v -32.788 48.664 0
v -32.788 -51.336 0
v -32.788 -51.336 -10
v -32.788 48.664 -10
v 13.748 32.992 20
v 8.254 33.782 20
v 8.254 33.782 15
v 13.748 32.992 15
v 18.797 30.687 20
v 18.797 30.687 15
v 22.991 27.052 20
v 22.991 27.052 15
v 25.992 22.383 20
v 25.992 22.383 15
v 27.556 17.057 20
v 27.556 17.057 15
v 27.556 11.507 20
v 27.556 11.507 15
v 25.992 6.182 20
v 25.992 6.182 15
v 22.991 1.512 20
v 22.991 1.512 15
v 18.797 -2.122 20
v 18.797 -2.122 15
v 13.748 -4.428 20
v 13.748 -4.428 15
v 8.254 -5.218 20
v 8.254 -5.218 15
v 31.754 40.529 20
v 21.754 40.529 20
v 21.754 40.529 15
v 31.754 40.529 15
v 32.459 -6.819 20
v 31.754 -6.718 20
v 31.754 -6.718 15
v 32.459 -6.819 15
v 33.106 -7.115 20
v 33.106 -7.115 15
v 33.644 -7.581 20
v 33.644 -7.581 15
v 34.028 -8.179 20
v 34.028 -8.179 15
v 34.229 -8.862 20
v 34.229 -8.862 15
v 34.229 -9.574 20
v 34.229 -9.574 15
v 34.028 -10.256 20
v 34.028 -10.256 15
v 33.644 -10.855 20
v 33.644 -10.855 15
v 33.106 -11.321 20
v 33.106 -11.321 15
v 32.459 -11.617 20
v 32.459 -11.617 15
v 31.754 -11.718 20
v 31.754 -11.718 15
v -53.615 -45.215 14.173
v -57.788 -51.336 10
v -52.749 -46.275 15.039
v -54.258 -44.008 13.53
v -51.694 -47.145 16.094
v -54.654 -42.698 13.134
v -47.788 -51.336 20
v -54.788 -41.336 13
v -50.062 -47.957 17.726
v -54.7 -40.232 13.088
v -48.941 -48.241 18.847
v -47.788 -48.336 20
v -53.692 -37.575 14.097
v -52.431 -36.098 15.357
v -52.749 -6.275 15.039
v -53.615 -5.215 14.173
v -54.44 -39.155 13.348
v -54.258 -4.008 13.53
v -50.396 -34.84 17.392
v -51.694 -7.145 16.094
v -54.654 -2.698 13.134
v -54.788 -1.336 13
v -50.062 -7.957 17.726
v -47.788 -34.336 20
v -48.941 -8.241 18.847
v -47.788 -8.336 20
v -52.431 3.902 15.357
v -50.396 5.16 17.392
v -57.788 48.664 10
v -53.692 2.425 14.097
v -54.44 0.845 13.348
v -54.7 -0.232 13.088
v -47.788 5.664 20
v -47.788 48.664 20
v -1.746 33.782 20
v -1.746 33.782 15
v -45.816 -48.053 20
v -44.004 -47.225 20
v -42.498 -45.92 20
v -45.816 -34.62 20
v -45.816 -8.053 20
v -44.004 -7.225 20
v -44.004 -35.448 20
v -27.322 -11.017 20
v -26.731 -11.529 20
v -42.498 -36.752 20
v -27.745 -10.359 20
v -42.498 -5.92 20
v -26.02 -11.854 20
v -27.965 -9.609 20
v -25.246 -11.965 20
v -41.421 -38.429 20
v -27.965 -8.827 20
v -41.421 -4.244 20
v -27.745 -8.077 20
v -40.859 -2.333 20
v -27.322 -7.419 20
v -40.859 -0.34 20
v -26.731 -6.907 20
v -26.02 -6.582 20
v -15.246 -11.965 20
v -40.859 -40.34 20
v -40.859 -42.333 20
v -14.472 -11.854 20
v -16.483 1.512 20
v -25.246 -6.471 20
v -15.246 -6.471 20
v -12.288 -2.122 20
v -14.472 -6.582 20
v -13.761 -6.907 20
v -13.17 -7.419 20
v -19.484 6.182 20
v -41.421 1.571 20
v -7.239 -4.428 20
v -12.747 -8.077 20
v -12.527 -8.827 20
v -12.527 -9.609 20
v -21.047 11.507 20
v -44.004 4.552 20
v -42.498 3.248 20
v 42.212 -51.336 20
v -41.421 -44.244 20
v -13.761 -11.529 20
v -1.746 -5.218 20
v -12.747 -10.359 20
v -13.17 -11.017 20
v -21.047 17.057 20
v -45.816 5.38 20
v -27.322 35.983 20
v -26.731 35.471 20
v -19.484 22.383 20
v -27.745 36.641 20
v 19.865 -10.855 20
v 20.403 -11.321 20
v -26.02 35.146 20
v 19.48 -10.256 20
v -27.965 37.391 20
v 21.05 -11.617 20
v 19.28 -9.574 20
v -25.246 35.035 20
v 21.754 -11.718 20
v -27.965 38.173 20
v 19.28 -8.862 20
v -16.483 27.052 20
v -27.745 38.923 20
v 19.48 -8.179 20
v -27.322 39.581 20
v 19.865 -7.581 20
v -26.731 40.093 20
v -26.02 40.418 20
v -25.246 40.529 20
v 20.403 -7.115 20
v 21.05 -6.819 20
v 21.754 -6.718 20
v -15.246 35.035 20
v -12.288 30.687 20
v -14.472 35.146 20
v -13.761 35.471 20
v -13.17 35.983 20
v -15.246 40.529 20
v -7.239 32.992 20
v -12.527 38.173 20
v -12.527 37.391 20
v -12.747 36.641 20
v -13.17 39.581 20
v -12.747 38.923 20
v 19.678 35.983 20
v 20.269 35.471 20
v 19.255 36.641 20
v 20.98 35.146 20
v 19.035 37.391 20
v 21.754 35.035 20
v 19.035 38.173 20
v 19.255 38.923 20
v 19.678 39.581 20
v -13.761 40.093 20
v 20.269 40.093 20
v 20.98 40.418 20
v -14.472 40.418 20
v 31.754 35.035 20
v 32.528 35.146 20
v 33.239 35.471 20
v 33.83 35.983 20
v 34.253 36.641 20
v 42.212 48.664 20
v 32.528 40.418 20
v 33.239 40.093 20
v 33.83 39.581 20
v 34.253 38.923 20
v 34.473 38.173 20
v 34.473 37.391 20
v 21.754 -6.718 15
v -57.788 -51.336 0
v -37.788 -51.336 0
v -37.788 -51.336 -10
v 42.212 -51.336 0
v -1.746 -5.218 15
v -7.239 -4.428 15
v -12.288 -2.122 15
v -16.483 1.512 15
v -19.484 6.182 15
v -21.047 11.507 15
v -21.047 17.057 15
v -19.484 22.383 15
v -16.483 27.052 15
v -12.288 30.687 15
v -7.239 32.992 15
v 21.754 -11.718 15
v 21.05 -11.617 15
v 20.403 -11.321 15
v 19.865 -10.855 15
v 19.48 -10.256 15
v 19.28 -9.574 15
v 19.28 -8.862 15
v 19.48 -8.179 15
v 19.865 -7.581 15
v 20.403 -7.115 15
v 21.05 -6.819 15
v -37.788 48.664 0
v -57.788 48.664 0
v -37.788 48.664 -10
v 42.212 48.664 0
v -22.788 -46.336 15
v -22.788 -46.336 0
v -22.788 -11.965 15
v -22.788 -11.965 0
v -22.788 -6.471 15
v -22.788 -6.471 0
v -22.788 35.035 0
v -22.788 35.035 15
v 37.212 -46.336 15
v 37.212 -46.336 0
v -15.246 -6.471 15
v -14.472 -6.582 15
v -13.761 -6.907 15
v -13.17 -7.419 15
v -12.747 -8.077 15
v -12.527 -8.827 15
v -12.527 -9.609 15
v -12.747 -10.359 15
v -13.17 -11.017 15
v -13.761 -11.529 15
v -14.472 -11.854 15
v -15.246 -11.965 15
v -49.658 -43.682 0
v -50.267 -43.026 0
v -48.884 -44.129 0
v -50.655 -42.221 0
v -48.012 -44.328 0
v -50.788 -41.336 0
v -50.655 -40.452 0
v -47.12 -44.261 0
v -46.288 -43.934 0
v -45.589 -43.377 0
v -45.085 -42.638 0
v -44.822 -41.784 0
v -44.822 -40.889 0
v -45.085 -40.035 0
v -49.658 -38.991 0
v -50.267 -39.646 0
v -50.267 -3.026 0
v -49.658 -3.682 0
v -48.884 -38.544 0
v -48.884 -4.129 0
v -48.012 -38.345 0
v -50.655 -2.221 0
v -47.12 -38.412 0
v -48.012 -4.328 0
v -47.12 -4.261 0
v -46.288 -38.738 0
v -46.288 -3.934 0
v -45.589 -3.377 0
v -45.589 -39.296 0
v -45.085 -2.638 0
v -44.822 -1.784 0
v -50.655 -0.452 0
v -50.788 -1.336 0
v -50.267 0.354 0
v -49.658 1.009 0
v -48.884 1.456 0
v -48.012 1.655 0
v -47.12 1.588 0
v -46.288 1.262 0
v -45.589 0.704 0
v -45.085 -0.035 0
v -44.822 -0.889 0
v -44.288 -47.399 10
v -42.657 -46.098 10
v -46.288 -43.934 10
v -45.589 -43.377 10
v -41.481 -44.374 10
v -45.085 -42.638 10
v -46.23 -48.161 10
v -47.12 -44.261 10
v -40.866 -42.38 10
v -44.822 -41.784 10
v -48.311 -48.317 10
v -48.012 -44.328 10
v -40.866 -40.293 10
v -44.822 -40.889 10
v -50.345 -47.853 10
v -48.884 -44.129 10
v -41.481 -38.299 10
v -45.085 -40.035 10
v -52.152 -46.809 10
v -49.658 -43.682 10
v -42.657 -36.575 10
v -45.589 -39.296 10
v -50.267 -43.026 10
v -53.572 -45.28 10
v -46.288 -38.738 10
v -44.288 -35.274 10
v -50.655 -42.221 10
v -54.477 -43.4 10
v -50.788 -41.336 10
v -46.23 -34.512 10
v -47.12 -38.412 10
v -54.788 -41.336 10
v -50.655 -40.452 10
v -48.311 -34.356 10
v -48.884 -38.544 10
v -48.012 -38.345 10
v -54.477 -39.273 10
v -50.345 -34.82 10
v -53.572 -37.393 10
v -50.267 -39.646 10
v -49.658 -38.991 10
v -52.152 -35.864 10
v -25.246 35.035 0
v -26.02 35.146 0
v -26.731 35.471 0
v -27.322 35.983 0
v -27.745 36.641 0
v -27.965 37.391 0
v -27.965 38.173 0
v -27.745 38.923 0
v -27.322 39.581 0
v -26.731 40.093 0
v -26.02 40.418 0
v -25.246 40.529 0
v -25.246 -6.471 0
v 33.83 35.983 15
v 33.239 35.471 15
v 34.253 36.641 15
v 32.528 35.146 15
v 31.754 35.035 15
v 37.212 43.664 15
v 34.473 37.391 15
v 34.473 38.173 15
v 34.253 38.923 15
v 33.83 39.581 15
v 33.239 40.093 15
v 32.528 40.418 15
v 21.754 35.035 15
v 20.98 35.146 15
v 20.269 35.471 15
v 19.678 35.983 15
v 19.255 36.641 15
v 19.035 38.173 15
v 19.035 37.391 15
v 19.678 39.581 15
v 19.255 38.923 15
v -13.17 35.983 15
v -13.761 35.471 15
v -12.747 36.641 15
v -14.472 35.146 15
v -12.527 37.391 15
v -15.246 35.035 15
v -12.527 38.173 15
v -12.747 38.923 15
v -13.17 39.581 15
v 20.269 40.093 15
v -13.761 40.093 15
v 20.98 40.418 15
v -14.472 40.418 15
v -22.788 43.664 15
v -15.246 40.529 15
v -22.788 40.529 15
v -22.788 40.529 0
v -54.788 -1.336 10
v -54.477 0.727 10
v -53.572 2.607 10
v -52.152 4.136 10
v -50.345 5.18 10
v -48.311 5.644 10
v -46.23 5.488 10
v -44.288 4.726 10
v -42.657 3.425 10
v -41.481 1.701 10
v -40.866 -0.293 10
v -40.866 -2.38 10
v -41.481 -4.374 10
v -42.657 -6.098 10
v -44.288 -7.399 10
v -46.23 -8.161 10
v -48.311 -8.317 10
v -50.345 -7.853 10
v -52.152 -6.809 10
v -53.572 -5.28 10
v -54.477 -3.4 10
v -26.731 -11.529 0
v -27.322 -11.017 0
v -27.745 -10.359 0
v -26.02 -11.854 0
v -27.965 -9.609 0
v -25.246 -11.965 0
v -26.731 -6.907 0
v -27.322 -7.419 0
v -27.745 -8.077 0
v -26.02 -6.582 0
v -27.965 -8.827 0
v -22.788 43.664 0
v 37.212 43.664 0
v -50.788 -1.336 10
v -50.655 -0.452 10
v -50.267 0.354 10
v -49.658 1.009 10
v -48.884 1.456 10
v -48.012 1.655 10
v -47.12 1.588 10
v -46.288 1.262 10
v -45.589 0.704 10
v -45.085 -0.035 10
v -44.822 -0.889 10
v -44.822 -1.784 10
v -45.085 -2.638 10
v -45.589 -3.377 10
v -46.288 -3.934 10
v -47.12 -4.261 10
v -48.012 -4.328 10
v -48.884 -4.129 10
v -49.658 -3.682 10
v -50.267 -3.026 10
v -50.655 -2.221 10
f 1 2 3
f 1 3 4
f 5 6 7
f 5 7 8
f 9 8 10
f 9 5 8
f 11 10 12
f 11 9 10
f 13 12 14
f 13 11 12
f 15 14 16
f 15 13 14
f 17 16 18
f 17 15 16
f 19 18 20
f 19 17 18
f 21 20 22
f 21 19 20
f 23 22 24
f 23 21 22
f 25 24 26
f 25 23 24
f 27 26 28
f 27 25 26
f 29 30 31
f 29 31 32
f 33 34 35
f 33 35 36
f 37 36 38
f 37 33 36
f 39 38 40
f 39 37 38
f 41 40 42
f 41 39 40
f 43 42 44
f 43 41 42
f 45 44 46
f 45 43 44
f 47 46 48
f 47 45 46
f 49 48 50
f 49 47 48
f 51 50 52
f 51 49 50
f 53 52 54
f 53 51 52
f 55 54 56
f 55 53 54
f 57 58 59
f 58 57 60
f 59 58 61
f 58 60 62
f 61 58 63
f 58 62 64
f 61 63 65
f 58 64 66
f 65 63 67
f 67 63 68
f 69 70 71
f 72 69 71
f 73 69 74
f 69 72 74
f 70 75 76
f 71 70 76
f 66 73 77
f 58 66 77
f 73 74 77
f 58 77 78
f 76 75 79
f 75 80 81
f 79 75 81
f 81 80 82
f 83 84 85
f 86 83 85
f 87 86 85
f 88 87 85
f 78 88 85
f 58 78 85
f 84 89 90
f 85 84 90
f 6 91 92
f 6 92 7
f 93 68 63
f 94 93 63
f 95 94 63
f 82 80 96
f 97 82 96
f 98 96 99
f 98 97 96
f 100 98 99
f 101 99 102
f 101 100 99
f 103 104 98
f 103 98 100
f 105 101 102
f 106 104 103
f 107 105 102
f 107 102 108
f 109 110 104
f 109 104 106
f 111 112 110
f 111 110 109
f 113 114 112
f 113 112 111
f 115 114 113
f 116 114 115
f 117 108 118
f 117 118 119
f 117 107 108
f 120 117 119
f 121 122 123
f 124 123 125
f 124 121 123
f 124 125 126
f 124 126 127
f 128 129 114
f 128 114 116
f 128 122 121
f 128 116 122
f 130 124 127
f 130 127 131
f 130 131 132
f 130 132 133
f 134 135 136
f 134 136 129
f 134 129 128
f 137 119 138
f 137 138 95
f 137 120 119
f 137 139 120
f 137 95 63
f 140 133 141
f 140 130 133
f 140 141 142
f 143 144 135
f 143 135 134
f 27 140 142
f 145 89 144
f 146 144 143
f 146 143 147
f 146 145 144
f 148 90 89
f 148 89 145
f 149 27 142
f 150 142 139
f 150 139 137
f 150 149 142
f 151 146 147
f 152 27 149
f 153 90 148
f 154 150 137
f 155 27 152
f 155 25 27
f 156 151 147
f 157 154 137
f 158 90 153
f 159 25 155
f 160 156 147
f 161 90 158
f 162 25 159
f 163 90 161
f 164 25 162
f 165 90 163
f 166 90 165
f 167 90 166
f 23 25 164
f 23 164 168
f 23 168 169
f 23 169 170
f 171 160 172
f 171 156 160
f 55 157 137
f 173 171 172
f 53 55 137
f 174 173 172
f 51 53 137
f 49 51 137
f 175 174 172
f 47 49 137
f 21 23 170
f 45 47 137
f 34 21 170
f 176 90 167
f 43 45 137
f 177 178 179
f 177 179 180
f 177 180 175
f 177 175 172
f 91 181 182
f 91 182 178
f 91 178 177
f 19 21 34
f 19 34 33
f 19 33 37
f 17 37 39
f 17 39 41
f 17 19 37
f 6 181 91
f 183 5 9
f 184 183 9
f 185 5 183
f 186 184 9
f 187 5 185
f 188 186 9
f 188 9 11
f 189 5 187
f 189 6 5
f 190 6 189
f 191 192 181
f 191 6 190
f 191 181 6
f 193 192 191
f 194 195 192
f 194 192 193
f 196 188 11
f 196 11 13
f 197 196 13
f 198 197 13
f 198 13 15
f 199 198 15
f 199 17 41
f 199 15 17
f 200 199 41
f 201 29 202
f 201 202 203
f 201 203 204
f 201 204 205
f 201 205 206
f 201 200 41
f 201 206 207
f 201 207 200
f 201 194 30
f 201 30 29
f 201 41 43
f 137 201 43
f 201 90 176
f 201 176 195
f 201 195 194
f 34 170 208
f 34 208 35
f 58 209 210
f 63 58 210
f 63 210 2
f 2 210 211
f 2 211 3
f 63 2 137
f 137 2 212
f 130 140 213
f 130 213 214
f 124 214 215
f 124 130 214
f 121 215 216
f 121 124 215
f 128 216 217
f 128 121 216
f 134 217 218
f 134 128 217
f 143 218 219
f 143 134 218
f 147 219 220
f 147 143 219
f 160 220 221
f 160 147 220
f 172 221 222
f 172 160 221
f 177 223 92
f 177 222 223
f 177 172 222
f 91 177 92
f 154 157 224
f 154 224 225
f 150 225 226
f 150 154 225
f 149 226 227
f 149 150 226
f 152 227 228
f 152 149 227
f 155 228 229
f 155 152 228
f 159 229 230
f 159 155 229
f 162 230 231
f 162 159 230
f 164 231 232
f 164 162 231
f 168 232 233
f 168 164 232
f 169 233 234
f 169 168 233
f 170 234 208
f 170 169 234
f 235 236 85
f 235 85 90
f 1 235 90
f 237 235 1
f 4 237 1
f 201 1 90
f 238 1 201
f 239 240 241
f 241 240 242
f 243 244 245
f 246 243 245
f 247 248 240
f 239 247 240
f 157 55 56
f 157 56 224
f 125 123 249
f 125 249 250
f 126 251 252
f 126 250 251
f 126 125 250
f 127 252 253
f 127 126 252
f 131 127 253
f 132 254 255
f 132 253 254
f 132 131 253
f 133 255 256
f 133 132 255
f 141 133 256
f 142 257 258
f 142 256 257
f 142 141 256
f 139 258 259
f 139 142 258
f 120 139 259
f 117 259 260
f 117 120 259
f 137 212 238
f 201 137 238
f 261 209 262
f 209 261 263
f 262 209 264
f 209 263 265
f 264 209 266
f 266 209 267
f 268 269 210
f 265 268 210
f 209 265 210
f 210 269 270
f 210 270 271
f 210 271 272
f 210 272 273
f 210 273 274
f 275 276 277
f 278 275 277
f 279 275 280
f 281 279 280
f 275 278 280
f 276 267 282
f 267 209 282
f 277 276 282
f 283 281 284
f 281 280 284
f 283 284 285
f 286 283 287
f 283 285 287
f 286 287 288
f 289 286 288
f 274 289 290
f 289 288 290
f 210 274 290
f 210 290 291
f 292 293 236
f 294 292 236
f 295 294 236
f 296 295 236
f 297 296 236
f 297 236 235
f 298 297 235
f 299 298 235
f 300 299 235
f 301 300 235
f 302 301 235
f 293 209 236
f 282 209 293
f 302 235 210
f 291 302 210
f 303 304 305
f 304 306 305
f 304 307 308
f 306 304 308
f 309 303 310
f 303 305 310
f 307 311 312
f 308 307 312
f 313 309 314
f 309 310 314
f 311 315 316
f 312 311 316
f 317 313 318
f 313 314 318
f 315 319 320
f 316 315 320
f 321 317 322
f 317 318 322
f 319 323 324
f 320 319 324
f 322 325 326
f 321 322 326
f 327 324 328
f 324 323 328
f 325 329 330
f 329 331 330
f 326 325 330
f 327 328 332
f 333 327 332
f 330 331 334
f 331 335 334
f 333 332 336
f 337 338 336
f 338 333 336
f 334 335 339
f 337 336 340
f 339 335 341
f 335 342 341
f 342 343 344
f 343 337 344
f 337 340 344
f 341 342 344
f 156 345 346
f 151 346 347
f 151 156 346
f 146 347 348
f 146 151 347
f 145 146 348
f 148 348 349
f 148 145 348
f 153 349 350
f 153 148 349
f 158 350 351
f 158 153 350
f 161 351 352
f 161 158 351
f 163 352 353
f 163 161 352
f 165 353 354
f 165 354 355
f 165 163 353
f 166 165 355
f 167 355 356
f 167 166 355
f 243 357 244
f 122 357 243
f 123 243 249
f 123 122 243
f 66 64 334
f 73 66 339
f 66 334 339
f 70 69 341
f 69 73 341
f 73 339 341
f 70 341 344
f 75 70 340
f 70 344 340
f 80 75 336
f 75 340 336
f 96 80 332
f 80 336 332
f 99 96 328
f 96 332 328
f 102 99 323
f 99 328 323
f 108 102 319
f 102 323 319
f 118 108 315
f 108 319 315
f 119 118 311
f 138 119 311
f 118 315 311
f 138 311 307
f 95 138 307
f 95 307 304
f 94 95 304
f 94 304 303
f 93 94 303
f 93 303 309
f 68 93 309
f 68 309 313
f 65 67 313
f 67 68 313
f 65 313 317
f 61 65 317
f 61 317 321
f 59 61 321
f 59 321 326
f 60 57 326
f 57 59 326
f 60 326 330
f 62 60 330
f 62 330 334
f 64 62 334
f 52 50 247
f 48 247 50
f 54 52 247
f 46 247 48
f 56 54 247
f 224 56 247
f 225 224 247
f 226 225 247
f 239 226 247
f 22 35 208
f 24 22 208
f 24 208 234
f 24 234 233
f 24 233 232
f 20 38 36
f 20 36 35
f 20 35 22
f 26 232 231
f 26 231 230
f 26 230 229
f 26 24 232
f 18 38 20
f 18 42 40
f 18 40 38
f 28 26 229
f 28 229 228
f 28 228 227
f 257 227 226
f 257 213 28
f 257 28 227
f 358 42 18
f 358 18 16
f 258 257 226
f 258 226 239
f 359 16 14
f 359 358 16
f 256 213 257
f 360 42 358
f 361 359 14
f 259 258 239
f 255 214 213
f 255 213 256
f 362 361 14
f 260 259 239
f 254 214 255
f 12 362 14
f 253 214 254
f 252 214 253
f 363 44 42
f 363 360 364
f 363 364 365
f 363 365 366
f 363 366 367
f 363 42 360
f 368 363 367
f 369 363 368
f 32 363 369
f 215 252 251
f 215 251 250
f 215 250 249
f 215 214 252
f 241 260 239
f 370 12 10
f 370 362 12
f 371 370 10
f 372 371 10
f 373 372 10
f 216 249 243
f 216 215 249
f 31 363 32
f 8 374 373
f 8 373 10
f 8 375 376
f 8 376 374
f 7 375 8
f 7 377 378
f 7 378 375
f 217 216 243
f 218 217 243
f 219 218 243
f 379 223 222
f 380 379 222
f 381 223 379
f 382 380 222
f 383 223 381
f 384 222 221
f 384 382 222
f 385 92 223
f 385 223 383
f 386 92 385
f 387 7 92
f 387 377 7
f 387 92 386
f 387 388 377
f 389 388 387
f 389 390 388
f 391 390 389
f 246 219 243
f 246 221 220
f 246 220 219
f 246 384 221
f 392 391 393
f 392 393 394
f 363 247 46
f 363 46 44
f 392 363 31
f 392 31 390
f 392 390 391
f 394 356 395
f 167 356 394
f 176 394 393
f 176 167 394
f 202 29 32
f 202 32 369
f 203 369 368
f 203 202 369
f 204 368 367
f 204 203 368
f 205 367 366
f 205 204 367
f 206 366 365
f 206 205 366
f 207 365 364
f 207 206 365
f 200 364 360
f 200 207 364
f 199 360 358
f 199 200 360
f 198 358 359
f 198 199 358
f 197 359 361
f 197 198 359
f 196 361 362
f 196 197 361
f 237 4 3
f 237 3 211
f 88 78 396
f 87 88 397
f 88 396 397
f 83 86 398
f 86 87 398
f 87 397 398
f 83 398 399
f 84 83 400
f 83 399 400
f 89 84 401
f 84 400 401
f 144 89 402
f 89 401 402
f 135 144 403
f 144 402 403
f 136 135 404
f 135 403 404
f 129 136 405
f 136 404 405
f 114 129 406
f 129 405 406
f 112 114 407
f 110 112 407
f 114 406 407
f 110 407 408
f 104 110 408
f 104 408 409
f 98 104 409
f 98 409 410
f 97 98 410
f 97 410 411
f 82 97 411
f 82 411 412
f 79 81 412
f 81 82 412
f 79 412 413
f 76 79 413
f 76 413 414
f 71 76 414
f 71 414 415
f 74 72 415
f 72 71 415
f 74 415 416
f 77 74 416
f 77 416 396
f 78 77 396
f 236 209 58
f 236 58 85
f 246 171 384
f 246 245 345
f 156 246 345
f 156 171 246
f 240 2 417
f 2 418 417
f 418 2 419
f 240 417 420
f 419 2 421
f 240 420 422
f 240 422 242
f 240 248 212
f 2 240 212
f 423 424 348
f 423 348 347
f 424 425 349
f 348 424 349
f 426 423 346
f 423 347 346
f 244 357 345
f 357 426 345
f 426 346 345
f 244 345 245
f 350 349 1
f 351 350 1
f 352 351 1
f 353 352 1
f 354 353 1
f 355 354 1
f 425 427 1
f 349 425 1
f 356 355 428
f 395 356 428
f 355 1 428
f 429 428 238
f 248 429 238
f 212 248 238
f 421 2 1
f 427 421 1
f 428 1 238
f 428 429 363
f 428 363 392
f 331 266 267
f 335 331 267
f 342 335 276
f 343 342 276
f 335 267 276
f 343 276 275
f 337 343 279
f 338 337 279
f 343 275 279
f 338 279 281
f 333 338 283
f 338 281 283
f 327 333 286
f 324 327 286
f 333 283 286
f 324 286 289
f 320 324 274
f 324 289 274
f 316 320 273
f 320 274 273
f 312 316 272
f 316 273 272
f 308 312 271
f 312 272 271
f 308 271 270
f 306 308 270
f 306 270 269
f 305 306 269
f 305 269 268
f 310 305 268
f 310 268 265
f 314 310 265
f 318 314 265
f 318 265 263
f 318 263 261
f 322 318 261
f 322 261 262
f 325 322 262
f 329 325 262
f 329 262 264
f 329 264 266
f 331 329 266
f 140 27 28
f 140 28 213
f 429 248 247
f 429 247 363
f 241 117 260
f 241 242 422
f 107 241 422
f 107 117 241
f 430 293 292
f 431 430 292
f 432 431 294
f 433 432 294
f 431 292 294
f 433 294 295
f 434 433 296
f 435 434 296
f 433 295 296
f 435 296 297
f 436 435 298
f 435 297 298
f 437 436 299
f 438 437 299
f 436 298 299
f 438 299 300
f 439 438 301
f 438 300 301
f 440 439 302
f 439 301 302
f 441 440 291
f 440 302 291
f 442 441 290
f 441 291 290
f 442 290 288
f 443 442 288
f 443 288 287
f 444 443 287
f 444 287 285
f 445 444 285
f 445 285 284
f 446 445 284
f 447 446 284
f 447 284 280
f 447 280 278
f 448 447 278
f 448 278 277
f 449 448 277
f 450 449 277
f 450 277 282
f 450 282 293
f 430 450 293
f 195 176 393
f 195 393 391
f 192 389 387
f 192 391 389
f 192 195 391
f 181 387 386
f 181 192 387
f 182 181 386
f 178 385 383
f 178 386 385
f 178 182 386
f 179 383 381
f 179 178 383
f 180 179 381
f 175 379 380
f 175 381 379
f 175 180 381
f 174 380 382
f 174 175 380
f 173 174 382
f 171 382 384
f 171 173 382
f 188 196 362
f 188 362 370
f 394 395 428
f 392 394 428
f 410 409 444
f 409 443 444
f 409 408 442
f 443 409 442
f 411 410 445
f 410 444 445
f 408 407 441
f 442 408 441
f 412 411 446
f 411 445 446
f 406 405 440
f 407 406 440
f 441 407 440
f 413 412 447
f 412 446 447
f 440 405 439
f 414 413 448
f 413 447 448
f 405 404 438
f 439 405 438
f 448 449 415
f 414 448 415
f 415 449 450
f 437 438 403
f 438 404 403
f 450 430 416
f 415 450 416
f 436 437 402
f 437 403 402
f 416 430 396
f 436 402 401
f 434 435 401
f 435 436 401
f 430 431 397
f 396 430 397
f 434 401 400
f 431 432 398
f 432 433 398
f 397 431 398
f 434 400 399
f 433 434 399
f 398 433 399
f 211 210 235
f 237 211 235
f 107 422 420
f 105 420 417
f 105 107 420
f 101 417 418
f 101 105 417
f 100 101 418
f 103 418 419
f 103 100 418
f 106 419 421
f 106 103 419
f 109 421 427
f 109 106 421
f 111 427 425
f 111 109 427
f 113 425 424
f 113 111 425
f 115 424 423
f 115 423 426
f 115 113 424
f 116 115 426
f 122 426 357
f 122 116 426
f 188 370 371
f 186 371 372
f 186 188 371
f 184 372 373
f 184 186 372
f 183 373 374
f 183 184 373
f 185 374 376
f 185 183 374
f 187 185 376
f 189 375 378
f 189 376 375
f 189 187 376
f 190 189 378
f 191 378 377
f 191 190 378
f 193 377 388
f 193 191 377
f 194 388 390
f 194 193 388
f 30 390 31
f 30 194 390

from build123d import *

# Parameters (mm, degrees)
SKETCH1_W           = 100
SKETCH1_H           = 100
BOSS_EXTRUDE1_DEPTH = 20
CUT_EXTRUDE1_DEPTH  = 20
SKETCH6_W           = 60
SKETCH6_H           = 90
CUT_EXTRUDE2_DEPTH  = 15
SKETCH2_W           = 5
SKETCH2_H           = 100
BOSS_EXTRUDE2_DEPTH = 10
CHAMFER1_SIZE       = 10
SKETCH7_R           = 3
CUT_EXTRUDE3_DEPTH  = 50
CUT_EXTRUDE4_START  = -10
SKETCH9_R           = 7
CUT_EXTRUDE4_DEPTH  = 50
LPATTERN1_COUNT     = 2
LPATTERN1_PITCH     = 40


with BuildPart() as part:
    # Sketch1 → Boss-Extrude1 (new body)
    with BuildSketch(Plane.XY):
        with Locations((-7.788018433, -1.33640553)):
            Rectangle(SKETCH1_W, SKETCH1_H)
    extrude(amount=BOSS_EXTRUDE1_DEPTH)

    # Sketch5 → Cut-Extrude1 (cut)
    with BuildSketch(Plane.XY.offset(20)):
        with BuildLine():
            Line((31.754288081, -11.717886794), (21.754288081, -11.717886794))
            ThreePointArc((21.754288081, -11.717886794), (19.254288081, -9.217886794), (21.754288081, -6.717886794))
            Line((21.754288081, -6.717886794), (31.754288081, -6.717886794))
            ThreePointArc((31.754288081, -6.717886794), (34.254288081, -9.217886794), (31.754288081, -11.717886794))
        make_face()
        with BuildLine():
            Line((8.254288081, -5.217886794), (-1.745711919, -5.217886794))
            ThreePointArc((-1.745711919, -5.217886794), (-21.245711919, 14.282113206), (-1.745711919, 33.782113206))
            Line((-1.745711919, 33.782113206), (8.254288081, 33.782113206))
            ThreePointArc((8.254288081, 33.782113206), (27.754288081, 14.282113206), (8.254288081, -5.217886794))
        make_face()
        with BuildLine():
            Line((31.754288081, 35.035010382), (21.754288081, 35.035010382))
            ThreePointArc((21.754288081, 35.035010382), (19.007185257, 37.782113206), (21.754288081, 40.52921603))
            Line((21.754288081, 40.52921603), (31.754288081, 40.52921603))
            ThreePointArc((31.754288081, 40.52921603), (34.501390905, 37.782113206), (31.754288081, 35.035010382))
        make_face()
        with BuildLine():
            Line((-15.245711919, 35.035010382), (-25.245711919, 35.035010382))
            ThreePointArc((-25.245711919, 35.035010382), (-27.992814743, 37.782113206), (-25.245711919, 40.52921603))
            Line((-25.245711919, 40.52921603), (-15.245711919, 40.52921603))
            ThreePointArc((-15.245711919, 40.52921603), (-12.498609095, 37.782113206), (-15.245711919, 35.035010382))
        make_face()
        with BuildLine():
            Line((-15.245711919, -11.964989618), (-25.245711919, -11.964989618))
            ThreePointArc((-25.245711919, -11.964989618), (-27.992814743, -9.217886794), (-25.245711919, -6.47078397))
            Line((-25.245711919, -6.47078397), (-15.245711919, -6.47078397))
            ThreePointArc((-15.245711919, -6.47078397), (-12.498609095, -9.217886794), (-15.245711919, -11.964989618))
        make_face()
    extrude(amount=-CUT_EXTRUDE1_DEPTH, mode=Mode.SUBTRACT)

    # Sketch6 → Cut-Extrude2 (cut)
    with BuildSketch(Plane(origin=(0, 0, 0), x_dir=(-1, 0, 0), z_dir=(0, 0, -1))):
        with Locations((-7.211981567, -1.33640553)):
            Rectangle(SKETCH6_W, SKETCH6_H)
    extrude(amount=-CUT_EXTRUDE2_DEPTH, mode=Mode.SUBTRACT)

    # Sketch2 → Boss-Extrude2 (add)
    with BuildSketch(Plane(origin=(0, 0, 0), x_dir=(-1, 0, 0), z_dir=(0, 0, -1))):
        with Locations((35.288018433, -1.33640553)):
            Rectangle(SKETCH2_W, SKETCH2_H)
    extrude(amount=BOSS_EXTRUDE2_DEPTH)

    # Chamfer1
    chamfer1_edges = [part.edges().sort_by_distance(p)[0] for p in [
        (-57.788018433, -1.33640553, 20),
    ]]
    chamfer(chamfer1_edges, length=CHAMFER1_SIZE)

    # Sketch7 → Cut-Extrude3 (cut)
    with BuildSketch(Plane(origin=(0, 0, 0), x_dir=(-1, 0, 0), z_dir=(0, 0, -1))):
        with Locations((47.788018433, -41.33640553)):
            Circle(SKETCH7_R)
    cut_extrude3 = extrude(amount=-CUT_EXTRUDE3_DEPTH, mode=Mode.SUBTRACT)

    # Sketch9 → Cut-Extrude4 (cut)
    with BuildSketch(Plane(origin=(0, 0, 0), x_dir=(-1, 0, 0), z_dir=(0, 0, -1)).offset(CUT_EXTRUDE4_START)):
        with Locations((47.788018433, -41.33640553)):
            Circle(SKETCH9_R)
    cut_extrude4 = extrude(amount=-CUT_EXTRUDE4_DEPTH, mode=Mode.SUBTRACT)

    # LPattern1: Cut-Extrude3, Cut-Extrude4 ×2
    with Locations(*[(0, i * LPATTERN1_PITCH, 0) for i in range(1, LPATTERN1_COUNT)]):
        add(cut_extrude3, mode=Mode.SUBTRACT)
        add(cut_extrude4, mode=Mode.SUBTRACT)


solid = part.part
